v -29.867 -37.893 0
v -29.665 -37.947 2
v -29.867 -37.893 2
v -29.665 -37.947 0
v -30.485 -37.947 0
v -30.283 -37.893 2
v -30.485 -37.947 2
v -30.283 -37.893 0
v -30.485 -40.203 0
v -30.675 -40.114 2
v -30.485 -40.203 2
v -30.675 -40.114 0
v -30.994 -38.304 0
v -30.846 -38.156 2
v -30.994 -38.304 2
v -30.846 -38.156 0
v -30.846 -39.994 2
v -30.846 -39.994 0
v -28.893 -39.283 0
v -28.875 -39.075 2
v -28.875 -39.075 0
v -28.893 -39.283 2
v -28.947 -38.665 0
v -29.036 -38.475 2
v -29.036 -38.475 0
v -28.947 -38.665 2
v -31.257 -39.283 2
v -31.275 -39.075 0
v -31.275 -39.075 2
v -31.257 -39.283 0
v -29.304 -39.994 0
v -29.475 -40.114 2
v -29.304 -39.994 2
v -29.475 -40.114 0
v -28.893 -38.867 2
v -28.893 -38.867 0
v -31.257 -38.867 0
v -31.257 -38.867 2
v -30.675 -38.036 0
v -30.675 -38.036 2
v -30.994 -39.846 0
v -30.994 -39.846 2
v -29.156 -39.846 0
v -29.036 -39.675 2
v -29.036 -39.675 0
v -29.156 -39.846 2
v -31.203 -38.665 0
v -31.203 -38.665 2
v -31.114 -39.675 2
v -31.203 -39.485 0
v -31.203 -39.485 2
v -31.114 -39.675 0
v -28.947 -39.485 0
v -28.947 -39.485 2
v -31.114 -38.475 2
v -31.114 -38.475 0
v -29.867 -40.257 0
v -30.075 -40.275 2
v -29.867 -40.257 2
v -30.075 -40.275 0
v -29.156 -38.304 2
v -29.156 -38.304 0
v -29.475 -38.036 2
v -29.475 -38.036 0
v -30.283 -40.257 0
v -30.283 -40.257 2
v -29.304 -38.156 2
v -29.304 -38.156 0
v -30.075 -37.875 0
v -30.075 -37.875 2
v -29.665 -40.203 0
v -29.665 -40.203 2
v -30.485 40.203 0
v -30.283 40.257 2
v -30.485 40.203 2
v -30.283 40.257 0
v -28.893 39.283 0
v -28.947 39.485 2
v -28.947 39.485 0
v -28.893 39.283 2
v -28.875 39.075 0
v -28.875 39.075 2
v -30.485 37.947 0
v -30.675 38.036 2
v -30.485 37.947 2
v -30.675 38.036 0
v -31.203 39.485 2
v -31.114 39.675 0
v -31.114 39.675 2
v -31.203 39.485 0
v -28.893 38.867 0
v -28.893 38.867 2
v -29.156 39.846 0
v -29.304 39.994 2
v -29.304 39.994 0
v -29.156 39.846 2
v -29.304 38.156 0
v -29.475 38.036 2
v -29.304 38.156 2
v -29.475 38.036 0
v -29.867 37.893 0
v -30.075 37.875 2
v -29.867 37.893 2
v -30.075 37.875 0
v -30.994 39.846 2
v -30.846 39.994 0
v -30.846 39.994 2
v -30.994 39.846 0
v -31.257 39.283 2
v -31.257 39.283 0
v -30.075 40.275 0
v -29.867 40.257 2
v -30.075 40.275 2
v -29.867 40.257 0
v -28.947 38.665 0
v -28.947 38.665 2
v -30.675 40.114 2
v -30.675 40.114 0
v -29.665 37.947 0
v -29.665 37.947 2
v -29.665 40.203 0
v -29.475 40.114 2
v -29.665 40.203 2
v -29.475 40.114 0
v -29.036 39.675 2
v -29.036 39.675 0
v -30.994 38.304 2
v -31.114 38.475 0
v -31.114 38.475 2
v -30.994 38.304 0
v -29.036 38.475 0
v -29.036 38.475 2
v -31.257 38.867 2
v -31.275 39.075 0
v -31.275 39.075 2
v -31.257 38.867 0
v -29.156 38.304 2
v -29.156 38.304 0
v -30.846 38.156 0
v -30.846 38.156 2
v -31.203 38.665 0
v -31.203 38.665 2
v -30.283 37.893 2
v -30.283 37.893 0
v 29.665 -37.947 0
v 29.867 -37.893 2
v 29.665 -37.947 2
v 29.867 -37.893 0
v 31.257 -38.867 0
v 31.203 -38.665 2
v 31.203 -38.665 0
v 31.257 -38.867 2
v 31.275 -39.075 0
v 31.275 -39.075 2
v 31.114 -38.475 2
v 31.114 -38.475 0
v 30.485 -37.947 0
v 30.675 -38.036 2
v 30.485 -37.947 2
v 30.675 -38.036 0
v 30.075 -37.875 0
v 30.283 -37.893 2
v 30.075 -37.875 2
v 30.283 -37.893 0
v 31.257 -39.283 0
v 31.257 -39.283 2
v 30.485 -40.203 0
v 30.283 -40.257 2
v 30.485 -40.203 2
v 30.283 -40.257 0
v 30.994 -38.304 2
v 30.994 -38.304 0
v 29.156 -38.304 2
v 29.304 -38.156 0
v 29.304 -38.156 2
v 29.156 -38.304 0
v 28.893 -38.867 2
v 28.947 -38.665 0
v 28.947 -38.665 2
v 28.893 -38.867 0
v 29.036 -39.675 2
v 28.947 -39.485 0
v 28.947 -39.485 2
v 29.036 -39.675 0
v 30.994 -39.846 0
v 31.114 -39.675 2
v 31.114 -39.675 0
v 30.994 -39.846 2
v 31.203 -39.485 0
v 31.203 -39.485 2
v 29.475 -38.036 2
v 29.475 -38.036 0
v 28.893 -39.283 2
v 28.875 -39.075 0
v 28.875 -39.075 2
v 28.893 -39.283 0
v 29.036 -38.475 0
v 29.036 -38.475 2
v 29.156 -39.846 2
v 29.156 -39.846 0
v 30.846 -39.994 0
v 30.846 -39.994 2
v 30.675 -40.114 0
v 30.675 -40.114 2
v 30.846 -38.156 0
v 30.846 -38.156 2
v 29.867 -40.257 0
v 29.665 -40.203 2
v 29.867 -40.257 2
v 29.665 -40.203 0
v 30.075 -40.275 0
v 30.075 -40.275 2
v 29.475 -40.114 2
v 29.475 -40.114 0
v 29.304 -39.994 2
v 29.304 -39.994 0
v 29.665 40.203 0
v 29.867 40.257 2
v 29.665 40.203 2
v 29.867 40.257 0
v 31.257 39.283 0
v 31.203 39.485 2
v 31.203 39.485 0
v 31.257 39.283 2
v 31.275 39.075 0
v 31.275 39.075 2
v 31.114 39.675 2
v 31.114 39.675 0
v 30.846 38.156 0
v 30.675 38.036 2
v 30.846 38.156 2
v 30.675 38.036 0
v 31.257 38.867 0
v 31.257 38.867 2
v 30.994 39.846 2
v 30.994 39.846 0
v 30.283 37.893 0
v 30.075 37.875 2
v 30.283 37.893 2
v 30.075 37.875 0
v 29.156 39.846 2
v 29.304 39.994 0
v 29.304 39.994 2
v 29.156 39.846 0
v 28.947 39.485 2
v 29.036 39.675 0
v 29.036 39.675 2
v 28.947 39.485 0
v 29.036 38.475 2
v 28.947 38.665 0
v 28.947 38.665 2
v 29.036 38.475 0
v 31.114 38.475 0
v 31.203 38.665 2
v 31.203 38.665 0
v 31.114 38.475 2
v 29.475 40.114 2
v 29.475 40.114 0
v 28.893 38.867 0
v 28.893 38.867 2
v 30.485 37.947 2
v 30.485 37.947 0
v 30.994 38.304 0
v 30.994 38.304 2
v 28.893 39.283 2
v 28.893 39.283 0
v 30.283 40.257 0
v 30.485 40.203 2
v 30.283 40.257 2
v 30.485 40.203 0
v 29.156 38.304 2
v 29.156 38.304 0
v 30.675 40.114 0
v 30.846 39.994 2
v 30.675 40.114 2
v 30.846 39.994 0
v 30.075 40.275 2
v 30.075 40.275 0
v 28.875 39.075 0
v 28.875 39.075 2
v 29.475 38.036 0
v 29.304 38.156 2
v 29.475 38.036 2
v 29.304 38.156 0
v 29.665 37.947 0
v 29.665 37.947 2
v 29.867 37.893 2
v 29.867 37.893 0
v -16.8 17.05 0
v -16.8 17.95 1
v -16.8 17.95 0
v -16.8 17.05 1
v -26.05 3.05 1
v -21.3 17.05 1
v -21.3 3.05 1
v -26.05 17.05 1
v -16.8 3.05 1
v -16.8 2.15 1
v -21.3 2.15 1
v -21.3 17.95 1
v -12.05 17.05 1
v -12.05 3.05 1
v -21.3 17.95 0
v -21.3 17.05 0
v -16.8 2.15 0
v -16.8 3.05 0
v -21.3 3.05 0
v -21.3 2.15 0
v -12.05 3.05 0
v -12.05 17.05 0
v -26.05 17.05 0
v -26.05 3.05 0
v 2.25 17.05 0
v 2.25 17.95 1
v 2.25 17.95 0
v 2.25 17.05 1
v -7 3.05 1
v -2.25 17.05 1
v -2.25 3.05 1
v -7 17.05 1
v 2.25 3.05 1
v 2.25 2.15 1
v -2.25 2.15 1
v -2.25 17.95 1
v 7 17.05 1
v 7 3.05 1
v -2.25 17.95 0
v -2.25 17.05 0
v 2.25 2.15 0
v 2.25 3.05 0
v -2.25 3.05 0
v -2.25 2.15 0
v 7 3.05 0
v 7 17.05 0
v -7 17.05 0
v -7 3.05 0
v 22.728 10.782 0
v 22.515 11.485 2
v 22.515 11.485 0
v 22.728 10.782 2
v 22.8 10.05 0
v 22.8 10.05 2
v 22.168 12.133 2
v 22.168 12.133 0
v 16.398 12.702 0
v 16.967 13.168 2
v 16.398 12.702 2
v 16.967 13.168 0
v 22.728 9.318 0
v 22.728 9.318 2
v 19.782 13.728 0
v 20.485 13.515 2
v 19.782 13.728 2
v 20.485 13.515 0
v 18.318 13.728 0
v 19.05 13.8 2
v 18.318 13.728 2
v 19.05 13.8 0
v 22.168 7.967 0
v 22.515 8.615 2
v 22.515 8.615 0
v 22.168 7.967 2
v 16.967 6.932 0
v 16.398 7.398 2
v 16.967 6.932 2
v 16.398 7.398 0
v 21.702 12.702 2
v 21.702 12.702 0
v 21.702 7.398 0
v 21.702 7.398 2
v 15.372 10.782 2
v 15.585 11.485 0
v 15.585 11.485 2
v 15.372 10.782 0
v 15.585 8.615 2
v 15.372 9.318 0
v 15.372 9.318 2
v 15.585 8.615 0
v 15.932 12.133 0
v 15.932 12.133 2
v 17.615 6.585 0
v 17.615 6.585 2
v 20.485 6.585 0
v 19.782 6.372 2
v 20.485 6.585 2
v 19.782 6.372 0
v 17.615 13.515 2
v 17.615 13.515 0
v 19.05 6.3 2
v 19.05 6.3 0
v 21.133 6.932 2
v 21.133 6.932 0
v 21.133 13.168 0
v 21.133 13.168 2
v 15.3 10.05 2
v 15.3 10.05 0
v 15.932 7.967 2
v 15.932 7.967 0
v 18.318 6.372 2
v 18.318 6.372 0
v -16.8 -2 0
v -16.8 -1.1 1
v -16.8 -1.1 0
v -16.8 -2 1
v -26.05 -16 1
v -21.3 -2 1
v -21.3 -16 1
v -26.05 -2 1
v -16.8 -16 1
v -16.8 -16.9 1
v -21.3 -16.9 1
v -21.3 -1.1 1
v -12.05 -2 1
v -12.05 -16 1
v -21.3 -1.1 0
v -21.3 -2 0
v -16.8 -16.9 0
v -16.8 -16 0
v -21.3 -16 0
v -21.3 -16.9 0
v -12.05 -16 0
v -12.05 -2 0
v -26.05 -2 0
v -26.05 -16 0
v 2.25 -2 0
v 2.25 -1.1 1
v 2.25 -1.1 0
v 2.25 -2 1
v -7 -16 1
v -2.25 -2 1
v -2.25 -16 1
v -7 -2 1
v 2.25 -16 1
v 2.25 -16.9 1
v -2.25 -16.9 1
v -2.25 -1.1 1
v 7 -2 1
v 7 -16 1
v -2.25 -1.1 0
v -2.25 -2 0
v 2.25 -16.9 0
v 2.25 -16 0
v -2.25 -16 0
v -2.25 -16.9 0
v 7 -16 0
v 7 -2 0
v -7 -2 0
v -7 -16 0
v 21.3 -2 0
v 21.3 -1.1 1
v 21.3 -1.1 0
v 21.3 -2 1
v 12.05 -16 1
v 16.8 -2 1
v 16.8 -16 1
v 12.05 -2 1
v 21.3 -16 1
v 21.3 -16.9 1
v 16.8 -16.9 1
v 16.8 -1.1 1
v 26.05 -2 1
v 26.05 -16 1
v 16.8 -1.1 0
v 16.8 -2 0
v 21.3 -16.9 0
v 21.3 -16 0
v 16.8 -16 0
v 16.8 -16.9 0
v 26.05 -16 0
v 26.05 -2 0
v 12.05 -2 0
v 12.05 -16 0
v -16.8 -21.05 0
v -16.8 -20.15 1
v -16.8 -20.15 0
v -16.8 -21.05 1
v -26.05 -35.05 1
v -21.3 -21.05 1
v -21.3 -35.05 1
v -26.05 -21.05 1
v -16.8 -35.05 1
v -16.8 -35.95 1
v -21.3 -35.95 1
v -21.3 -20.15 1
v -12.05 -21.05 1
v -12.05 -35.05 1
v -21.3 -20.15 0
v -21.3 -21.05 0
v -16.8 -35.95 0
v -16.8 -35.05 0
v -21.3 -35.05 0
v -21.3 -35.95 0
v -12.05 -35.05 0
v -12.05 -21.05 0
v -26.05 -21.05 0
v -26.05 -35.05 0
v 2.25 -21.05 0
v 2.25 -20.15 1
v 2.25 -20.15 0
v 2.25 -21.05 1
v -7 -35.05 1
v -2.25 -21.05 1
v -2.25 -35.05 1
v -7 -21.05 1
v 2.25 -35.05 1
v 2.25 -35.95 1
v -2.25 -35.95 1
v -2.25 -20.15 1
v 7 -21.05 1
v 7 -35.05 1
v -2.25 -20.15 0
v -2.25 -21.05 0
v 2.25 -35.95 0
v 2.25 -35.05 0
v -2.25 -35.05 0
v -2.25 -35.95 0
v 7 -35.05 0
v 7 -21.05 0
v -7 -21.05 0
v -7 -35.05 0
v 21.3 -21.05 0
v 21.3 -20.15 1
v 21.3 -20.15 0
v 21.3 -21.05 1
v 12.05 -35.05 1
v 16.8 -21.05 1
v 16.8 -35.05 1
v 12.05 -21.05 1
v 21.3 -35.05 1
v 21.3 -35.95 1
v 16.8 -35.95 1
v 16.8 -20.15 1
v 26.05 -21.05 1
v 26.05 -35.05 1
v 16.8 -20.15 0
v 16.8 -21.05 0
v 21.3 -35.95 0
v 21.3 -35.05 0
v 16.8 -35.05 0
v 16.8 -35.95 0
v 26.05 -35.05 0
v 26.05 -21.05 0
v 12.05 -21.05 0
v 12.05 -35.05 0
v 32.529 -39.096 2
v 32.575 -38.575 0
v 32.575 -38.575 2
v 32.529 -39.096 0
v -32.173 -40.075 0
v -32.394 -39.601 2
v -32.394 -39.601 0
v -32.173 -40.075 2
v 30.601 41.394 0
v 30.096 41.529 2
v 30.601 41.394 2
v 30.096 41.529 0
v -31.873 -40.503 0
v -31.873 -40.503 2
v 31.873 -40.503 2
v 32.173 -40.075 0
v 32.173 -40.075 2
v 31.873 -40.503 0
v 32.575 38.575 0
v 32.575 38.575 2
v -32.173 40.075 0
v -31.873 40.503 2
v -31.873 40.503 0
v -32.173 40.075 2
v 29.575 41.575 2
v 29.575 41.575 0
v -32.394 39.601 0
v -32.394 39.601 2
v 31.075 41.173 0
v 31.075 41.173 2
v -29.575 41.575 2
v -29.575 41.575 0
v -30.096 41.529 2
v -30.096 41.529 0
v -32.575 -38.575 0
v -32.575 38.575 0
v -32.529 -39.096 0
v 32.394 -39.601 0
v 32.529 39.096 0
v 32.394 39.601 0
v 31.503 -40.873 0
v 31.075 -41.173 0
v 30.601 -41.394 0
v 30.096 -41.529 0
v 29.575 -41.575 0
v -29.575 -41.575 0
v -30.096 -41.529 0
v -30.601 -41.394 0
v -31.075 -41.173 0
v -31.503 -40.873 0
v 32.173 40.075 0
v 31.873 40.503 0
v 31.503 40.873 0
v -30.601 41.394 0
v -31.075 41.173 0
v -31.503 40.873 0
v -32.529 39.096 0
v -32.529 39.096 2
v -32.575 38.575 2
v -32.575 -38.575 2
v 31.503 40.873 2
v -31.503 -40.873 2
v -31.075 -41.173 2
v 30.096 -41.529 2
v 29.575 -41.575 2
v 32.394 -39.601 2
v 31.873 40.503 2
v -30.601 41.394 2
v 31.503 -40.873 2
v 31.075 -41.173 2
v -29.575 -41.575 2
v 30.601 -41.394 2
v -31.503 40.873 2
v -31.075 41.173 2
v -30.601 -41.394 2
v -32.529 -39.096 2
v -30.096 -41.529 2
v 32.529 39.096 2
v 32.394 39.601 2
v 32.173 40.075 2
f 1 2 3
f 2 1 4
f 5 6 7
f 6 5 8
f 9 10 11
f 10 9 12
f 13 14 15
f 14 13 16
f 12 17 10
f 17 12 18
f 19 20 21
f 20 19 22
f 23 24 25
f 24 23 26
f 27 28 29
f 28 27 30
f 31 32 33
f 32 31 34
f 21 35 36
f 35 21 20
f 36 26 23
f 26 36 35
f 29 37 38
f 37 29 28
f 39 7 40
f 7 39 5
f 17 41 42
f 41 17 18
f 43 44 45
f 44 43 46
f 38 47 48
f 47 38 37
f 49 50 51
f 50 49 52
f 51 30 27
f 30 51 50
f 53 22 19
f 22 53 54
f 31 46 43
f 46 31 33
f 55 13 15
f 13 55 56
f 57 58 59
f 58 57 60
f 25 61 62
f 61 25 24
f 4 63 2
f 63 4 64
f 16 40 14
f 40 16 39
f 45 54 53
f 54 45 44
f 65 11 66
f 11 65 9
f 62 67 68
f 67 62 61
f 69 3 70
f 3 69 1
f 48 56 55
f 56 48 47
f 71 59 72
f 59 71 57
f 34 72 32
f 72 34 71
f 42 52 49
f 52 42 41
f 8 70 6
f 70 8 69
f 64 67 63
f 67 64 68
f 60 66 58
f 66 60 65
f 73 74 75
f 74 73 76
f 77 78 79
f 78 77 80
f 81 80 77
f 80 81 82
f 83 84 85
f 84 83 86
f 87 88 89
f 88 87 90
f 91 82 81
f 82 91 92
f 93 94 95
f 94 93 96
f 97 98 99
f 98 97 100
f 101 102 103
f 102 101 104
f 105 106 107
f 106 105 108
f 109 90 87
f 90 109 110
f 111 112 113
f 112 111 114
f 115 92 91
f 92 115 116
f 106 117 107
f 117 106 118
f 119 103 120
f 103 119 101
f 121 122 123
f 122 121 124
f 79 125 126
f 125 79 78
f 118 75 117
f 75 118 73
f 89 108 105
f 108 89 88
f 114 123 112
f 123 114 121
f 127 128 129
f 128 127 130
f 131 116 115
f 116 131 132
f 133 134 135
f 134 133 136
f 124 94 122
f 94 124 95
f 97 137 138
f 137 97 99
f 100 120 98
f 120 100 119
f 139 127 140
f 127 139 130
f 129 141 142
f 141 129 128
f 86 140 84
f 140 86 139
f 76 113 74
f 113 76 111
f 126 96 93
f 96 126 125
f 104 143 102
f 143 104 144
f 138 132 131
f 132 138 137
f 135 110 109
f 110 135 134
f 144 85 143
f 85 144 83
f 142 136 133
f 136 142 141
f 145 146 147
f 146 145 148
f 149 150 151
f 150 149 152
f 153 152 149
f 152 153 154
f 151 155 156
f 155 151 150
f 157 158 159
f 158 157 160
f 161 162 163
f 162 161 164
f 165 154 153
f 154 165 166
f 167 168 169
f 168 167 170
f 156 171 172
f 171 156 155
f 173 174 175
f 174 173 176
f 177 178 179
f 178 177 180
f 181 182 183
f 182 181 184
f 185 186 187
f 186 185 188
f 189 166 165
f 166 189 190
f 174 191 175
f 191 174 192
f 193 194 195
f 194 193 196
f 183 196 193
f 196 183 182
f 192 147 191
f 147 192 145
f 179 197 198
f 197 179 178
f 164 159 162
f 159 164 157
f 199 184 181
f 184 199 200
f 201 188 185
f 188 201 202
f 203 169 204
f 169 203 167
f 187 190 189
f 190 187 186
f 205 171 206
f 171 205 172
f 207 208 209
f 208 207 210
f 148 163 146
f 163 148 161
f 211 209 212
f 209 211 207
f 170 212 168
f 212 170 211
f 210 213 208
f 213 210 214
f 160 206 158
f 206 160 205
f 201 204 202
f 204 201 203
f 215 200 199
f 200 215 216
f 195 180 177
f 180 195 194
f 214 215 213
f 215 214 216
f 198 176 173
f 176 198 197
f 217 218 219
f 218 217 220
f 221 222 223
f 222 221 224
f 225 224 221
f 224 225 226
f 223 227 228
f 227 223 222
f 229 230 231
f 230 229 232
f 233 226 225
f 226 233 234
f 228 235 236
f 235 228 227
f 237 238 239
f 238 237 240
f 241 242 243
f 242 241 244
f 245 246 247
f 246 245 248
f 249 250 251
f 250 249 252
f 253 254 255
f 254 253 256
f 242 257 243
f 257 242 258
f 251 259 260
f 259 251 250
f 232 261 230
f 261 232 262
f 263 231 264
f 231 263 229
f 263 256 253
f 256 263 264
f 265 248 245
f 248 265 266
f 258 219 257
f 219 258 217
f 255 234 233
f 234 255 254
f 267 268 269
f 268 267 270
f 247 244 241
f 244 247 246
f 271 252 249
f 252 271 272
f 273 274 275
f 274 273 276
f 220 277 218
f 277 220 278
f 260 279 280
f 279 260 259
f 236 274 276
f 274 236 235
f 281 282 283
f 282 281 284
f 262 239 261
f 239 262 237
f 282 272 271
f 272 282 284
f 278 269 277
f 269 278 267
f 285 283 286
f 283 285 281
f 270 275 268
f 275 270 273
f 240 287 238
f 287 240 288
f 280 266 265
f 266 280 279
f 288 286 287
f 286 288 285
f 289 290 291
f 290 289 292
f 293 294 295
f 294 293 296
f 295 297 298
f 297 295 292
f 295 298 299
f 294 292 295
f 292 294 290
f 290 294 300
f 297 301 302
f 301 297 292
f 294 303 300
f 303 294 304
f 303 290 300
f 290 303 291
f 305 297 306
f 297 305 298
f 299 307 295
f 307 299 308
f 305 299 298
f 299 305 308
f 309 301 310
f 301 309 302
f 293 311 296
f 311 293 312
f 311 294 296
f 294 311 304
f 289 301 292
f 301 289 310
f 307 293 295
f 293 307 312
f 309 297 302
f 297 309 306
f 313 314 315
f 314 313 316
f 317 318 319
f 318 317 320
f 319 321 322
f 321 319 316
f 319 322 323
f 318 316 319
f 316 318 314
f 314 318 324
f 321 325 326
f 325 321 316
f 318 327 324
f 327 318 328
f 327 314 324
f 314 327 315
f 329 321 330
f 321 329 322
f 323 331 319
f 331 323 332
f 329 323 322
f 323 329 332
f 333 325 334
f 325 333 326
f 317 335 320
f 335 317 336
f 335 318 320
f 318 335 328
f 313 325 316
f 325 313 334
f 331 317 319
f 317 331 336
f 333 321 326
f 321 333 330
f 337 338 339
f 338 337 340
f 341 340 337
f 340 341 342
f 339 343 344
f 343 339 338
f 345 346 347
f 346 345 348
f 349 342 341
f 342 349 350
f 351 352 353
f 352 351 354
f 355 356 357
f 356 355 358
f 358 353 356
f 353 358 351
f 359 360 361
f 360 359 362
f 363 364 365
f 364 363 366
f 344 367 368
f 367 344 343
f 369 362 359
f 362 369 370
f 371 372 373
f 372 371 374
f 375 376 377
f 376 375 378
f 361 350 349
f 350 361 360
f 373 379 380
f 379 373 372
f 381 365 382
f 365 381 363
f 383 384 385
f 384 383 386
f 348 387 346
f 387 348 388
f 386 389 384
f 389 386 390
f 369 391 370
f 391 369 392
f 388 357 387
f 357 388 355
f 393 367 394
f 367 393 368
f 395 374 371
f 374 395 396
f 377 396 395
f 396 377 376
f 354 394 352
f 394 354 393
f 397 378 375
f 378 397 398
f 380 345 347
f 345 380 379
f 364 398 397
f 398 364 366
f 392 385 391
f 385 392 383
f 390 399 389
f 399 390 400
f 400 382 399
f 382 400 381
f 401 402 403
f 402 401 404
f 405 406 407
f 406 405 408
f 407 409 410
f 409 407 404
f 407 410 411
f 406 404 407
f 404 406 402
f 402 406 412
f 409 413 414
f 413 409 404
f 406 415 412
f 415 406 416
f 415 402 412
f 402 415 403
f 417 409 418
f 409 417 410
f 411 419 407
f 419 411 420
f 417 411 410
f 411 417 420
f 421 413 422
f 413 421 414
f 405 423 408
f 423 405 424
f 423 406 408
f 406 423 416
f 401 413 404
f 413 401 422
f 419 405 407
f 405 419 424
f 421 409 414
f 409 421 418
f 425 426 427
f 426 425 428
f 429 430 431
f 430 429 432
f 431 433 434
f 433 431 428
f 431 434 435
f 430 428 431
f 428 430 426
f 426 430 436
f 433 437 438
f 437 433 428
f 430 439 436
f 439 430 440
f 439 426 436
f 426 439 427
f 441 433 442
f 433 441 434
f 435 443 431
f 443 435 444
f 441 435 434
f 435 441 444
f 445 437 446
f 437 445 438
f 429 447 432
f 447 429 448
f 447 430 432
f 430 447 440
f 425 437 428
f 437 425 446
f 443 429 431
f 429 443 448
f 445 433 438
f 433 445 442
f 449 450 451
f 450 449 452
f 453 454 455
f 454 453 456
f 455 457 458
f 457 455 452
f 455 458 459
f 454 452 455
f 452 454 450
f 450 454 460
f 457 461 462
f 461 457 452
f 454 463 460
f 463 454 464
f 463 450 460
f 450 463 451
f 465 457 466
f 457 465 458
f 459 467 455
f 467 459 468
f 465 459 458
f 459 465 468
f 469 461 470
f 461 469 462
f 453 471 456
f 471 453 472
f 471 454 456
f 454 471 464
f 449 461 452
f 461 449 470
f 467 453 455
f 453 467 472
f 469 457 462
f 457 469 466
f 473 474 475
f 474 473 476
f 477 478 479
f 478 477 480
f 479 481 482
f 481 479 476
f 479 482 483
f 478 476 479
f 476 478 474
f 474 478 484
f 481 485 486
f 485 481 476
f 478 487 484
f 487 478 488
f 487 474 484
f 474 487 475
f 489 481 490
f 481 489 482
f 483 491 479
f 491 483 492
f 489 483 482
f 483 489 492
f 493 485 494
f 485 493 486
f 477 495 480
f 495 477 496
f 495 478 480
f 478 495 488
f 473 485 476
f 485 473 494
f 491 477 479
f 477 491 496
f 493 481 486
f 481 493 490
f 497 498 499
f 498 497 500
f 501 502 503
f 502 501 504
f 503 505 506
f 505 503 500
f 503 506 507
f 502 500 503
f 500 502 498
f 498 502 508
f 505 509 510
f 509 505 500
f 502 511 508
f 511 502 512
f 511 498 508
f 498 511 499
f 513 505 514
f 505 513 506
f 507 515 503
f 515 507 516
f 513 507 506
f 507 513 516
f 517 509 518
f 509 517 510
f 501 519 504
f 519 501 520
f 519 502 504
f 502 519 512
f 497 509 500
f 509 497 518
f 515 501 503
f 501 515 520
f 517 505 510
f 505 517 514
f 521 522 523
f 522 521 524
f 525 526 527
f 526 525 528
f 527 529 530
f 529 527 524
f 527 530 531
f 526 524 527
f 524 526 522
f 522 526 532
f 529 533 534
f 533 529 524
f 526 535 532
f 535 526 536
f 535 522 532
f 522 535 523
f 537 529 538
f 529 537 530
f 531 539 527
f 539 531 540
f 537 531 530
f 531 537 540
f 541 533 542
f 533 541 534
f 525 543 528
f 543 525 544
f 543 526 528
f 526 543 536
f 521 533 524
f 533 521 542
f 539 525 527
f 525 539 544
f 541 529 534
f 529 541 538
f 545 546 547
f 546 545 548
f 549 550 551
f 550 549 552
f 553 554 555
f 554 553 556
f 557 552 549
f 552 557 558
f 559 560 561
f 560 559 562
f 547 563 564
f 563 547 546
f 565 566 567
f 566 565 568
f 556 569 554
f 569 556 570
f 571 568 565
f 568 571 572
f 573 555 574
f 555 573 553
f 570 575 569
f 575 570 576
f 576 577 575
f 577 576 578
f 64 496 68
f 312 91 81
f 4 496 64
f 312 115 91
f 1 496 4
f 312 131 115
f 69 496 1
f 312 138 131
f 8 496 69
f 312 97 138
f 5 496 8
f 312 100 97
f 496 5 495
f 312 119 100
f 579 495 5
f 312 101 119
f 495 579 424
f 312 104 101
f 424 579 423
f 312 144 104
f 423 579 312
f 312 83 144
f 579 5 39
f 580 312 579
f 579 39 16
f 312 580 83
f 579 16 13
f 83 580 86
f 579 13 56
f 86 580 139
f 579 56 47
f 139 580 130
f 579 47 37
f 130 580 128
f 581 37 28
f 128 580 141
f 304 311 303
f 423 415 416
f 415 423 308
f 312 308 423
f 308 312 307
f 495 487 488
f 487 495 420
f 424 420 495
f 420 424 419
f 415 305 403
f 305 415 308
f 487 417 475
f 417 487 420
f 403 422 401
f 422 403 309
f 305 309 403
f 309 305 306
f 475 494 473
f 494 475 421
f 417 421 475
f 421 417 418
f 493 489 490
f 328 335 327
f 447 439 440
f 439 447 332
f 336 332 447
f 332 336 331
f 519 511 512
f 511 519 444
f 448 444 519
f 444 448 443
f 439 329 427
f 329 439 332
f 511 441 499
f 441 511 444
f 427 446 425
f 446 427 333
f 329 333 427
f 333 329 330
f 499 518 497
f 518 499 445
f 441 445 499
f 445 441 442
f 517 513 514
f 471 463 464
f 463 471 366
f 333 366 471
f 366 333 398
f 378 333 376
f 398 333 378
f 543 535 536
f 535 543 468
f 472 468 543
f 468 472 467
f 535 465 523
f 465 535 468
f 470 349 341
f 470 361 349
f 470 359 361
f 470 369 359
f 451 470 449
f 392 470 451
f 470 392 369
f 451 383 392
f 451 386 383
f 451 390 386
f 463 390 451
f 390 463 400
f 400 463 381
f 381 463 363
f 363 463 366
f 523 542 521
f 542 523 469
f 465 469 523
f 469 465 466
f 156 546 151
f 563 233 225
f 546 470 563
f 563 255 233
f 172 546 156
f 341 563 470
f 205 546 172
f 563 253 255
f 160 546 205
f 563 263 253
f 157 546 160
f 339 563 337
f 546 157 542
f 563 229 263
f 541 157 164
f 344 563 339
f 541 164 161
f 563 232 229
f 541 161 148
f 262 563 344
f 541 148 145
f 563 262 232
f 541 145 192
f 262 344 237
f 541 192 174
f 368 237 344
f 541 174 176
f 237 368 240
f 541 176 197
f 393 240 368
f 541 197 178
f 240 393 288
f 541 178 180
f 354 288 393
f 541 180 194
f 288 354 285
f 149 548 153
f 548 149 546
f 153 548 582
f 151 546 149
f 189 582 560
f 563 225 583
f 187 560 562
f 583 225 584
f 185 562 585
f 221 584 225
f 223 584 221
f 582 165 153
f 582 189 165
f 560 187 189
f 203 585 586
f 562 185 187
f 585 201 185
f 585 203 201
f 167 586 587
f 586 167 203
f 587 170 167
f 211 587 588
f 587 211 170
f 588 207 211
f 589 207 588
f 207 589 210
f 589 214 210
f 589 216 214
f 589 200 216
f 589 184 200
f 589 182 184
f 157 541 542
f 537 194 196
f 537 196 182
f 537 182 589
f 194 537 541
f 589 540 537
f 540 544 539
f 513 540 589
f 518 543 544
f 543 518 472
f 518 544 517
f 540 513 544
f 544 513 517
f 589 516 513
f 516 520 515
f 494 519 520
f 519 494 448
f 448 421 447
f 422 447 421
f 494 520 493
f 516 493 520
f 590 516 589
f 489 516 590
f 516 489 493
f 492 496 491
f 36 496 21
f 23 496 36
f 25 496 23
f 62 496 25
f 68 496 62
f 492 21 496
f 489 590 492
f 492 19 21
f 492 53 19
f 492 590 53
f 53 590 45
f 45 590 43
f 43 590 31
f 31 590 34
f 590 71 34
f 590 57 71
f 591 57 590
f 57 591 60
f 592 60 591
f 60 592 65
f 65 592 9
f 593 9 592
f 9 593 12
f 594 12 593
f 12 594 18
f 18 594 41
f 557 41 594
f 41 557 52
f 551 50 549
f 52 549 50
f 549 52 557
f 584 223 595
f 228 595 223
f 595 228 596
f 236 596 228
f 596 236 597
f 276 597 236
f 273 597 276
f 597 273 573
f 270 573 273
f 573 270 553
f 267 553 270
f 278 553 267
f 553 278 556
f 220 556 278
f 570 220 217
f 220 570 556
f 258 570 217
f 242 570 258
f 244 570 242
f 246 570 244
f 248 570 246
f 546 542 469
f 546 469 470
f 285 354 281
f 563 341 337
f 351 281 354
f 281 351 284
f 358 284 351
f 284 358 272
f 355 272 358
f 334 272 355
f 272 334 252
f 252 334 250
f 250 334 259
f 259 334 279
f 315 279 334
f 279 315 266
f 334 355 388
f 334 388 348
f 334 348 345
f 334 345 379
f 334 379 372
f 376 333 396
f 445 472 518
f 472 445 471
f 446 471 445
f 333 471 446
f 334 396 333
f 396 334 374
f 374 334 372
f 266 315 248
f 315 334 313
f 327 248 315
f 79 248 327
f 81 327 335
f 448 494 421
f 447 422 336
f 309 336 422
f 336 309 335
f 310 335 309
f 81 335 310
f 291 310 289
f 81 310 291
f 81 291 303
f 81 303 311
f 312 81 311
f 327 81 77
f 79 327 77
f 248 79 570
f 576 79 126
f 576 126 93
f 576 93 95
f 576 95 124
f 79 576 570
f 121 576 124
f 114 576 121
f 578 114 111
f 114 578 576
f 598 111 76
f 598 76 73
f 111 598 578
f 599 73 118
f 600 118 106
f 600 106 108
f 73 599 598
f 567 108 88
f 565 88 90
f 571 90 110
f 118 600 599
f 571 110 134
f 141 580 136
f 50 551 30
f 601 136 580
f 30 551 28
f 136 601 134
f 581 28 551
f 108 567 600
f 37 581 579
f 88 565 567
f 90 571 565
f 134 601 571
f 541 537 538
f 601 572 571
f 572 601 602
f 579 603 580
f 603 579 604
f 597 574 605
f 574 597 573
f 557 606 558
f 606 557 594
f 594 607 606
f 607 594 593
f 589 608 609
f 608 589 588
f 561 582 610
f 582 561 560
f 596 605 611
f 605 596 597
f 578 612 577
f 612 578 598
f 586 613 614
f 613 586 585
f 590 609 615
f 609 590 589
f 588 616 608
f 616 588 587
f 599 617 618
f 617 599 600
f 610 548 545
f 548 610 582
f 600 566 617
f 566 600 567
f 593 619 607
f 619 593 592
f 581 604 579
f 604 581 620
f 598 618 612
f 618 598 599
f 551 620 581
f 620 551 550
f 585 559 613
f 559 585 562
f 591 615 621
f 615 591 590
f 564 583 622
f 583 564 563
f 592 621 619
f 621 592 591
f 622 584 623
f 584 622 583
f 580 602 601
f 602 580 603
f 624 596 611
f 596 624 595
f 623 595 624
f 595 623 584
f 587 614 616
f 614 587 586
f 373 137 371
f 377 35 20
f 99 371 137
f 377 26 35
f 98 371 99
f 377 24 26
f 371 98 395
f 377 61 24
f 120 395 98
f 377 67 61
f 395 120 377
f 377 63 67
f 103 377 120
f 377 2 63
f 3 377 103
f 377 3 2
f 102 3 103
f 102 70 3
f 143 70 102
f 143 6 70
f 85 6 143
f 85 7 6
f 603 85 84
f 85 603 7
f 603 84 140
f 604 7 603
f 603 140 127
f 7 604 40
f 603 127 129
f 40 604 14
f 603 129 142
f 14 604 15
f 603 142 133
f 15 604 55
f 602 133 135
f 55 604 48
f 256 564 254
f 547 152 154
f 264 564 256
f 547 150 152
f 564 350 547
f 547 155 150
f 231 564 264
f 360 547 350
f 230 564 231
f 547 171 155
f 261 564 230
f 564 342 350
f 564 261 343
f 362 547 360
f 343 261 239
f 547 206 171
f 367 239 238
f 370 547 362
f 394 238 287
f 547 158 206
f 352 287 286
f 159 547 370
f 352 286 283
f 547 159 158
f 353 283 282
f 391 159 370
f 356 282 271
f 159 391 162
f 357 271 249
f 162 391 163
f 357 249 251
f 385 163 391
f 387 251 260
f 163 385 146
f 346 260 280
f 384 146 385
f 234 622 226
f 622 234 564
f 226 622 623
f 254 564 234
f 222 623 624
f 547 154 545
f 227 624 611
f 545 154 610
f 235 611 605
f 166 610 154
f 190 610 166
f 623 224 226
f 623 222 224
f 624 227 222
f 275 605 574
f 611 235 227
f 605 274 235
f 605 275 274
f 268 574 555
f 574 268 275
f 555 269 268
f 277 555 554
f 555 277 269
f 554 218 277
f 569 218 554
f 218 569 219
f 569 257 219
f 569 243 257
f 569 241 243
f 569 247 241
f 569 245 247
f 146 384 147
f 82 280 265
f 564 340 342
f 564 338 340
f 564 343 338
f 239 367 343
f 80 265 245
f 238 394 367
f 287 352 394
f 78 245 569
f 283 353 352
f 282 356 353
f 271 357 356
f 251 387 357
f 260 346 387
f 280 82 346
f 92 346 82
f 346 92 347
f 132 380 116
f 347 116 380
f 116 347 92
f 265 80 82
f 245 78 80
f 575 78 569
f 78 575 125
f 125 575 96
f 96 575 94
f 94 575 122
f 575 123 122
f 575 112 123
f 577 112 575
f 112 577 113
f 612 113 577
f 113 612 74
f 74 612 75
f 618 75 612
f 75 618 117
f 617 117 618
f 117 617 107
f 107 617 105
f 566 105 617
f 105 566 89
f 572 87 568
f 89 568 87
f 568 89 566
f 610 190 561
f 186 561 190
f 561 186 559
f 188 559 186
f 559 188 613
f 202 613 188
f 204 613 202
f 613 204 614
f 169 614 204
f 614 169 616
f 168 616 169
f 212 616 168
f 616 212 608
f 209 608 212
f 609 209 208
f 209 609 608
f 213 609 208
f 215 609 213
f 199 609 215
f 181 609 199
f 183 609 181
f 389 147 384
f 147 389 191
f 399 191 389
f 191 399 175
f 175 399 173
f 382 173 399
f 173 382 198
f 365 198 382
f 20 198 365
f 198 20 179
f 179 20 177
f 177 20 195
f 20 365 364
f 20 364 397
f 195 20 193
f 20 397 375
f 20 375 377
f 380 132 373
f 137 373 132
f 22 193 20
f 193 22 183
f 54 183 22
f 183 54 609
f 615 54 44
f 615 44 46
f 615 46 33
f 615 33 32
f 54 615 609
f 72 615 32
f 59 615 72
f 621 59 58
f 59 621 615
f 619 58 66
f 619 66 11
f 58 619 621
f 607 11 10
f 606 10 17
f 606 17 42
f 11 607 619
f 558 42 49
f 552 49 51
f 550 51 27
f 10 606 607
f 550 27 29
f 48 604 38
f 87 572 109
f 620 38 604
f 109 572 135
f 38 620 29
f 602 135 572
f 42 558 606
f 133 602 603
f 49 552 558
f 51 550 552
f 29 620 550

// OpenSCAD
// ==============================================================================
// PARAMETRIC MACROPAD TOP PLATE (SWITCH & ROTARY ENCODER MOUNTING PLATE)
// ==============================================================================
// Designed to pair with `macropad_grid_plate.scad` and `macropad_bottom_plate.scad`
// Features:
//  - Standard Cherry MX switch cutouts (14.0 x 14.0mm) with side clip relief notches
//  - EC11 Rotary Encoder shaft pass-through collar (fits standard M7 bushing)
//  - M2 corner screw pass-through holes aligning with the midplate & bottom case
//  - Clean perimeter bevel and optional top status window
// ==============================================================================

// ------------------------------------------------------------------------------
// PARAMETRIC CONFIGURATION
// ------------------------------------------------------------------------------
/* [Grid Dimensions] */
rows = 3; // [1:10]
cols = 3; // [1:10]
pitch = 19.05; // Standard Cherry MX key pitch (19.05mm)

// Plate thickness: Standard MX switch latch plate is 1.5mm (or 3.0mm with clip lip)
top_plate_h = 2.0;

// Perimeter border margins (must match macropad_grid_plate.scad)
border_margin_x = 4.0;
border_margin_bottom = 4.0;
mcu_dock_depth = 22.0; 
corner_r = 3.0;

/* [Encoder Placement] */
// [row, col] -> [[0, 2]] places knob in top-right corner
encoder_locations = [
    [0, 2]
];

/* [Switch Cutout Specs] */
// Standard Cherry MX plate cutout is 14.0mm x 14.0mm
switch_cutout_size = 14.0;
// Side relief notches for switch retention clips (0.8mm x 4.0mm on top/bottom edges)
include_clip_notches = true;

// EC11 Bushing collar hole diameter (7.5mm for standard M7 threaded bushing)
encoder_hole_d = 7.5;

/* [Mounting Screws] */
mount_hole_d = 2.4; // M2 screw clear pass-through (2.4mm)
mount_hole_inset = 2.5;

// MCU Status / OLED / Reset window on top dock (optional)
include_mcu_window = false;
mcu_window_w = 20.0;
mcu_window_l = 14.0;

$fn = 36;

// ------------------------------------------------------------------------------
// MAIN RENDER
// ------------------------------------------------------------------------------
macropad_top_plate(
    rows = rows,
    cols = cols,
    pitch = pitch,
    top_plate_h = top_plate_h,
    border_margin_x = border_margin_x,
    border_margin_bottom = border_margin_bottom,
    mcu_dock_depth = mcu_dock_depth,
    corner_r = corner_r,
    encoder_coords = encoder_locations,
    switch_cutout_size = switch_cutout_size,
    encoder_hole_d = encoder_hole_d,
    include_clip_notches = include_clip_notches,
    include_mcu_window = include_mcu_window
);

// ==============================================================================
// MODULE: MACROPAD TOP PLATE
// ==============================================================================
module macropad_top_plate(
    rows = 3,
    cols = 3,
    pitch = 19.05,
    top_plate_h = 2.0,
    border_margin_x = 4.0,
    border_margin_bottom = 4.0,
    mcu_dock_depth = 22.0,
    corner_r = 3.0,
    encoder_coords = [[0, 2]],
    switch_cutout_size = 14.0,
    encoder_hole_d = 7.5,
    include_clip_notches = true,
    include_mcu_window = false
) {
    total_w = (cols * pitch) + (border_margin_x * 2);
    grid_l  = (rows * pitch);
    total_l = grid_l + border_margin_bottom + mcu_dock_depth;

    start_x = -((cols - 1) * pitch) / 2;
    grid_center_y = -mcu_dock_depth / 2 + border_margin_bottom / 2;
    start_y = grid_center_y + ((rows - 1) * pitch) / 2;

    dock_center_y = (total_l / 2) - (mcu_dock_depth / 2);

    difference() {
        // --- 1. Solid Top Plate Outline ---
        top_plate_box(total_w, total_l, top_plate_h, r=corner_r);

        // --- 2. Corner M2 Screw Pass-Through Holes ---
        corner_x = (total_w / 2) - mount_hole_inset;
        corner_y = (total_l / 2) - mount_hole_inset;
        for (mx = [-corner_x, corner_x]) {
            for (my = [-corner_y, corner_y]) {
                translate([mx, my, -1])
                    cylinder(d=mount_hole_d, h=top_plate_h + 2);
            }
        }

        // --- 3. Grid Cutouts (Switches and Rotary Encoders) ---
        for (r = [0 : rows - 1]) {
            for (c = [0 : cols - 1]) {
                pos_x = start_x + (c * pitch);
                pos_y = start_y - (r * pitch);

                is_encoder = check_is_encoder_top(r, c, encoder_coords);

                translate([pos_x, pos_y, 0]) {
                    if (is_encoder) {
                        // EC11 Rotary Encoder Collar Pass-Through
                        translate([0, 0, -1])
                            cylinder(d=encoder_hole_d, h=top_plate_h + 2, $fn=32);
                    } else {
                        // Standard Cherry MX 14.0mm Square Cutout
                        translate([0, 0, -1])
                            cube([switch_cutout_size, switch_cutout_size, top_plate_h + 2], center=true);

                        // Side clip relief notches for switch retention latches
                        if (include_clip_notches) {
                            translate([0,  switch_cutout_size/2 + 0.3, -1])
                                cube([4.5, 1.2, top_plate_h + 2], center=true);
                            translate([0, -switch_cutout_size/2 - 0.3, -1])
                                cube([4.5, 1.2, top_plate_h + 2], center=true);
                        }
                    }
                }
            }
        }

        // --- 4. Optional Top MCU Viewing / Reset Window ---
        if (include_mcu_window) {
            translate([0, dock_center_y, -1])
                cube([mcu_window_w, mcu_window_l, top_plate_h + 2], center=true);
        }
    }
}

function check_is_encoder_top(r, c, coords, idx = 0) =
    (idx >= len(coords)) ? false :
    (coords[idx][0] == r && coords[idx][1] == c) ? true :
    check_is_encoder_top(r, c, coords, idx + 1);

module top_plate_box(w, l, h, r=3.0) {
    hull() {
        translate([-w/2 + r, -l/2 + r, 0]) cylinder(r=r, h=h);
        translate([ w/2 - r, -l/2 + r, 0]) cylinder(r=r, h=h);
        translate([ w/2 - r,  l/2 - r, 0]) cylinder(r=r, h=h);
        translate([-w/2 + r,  l/2 - r, 0]) cylinder(r=r, h=h);
    }
}
